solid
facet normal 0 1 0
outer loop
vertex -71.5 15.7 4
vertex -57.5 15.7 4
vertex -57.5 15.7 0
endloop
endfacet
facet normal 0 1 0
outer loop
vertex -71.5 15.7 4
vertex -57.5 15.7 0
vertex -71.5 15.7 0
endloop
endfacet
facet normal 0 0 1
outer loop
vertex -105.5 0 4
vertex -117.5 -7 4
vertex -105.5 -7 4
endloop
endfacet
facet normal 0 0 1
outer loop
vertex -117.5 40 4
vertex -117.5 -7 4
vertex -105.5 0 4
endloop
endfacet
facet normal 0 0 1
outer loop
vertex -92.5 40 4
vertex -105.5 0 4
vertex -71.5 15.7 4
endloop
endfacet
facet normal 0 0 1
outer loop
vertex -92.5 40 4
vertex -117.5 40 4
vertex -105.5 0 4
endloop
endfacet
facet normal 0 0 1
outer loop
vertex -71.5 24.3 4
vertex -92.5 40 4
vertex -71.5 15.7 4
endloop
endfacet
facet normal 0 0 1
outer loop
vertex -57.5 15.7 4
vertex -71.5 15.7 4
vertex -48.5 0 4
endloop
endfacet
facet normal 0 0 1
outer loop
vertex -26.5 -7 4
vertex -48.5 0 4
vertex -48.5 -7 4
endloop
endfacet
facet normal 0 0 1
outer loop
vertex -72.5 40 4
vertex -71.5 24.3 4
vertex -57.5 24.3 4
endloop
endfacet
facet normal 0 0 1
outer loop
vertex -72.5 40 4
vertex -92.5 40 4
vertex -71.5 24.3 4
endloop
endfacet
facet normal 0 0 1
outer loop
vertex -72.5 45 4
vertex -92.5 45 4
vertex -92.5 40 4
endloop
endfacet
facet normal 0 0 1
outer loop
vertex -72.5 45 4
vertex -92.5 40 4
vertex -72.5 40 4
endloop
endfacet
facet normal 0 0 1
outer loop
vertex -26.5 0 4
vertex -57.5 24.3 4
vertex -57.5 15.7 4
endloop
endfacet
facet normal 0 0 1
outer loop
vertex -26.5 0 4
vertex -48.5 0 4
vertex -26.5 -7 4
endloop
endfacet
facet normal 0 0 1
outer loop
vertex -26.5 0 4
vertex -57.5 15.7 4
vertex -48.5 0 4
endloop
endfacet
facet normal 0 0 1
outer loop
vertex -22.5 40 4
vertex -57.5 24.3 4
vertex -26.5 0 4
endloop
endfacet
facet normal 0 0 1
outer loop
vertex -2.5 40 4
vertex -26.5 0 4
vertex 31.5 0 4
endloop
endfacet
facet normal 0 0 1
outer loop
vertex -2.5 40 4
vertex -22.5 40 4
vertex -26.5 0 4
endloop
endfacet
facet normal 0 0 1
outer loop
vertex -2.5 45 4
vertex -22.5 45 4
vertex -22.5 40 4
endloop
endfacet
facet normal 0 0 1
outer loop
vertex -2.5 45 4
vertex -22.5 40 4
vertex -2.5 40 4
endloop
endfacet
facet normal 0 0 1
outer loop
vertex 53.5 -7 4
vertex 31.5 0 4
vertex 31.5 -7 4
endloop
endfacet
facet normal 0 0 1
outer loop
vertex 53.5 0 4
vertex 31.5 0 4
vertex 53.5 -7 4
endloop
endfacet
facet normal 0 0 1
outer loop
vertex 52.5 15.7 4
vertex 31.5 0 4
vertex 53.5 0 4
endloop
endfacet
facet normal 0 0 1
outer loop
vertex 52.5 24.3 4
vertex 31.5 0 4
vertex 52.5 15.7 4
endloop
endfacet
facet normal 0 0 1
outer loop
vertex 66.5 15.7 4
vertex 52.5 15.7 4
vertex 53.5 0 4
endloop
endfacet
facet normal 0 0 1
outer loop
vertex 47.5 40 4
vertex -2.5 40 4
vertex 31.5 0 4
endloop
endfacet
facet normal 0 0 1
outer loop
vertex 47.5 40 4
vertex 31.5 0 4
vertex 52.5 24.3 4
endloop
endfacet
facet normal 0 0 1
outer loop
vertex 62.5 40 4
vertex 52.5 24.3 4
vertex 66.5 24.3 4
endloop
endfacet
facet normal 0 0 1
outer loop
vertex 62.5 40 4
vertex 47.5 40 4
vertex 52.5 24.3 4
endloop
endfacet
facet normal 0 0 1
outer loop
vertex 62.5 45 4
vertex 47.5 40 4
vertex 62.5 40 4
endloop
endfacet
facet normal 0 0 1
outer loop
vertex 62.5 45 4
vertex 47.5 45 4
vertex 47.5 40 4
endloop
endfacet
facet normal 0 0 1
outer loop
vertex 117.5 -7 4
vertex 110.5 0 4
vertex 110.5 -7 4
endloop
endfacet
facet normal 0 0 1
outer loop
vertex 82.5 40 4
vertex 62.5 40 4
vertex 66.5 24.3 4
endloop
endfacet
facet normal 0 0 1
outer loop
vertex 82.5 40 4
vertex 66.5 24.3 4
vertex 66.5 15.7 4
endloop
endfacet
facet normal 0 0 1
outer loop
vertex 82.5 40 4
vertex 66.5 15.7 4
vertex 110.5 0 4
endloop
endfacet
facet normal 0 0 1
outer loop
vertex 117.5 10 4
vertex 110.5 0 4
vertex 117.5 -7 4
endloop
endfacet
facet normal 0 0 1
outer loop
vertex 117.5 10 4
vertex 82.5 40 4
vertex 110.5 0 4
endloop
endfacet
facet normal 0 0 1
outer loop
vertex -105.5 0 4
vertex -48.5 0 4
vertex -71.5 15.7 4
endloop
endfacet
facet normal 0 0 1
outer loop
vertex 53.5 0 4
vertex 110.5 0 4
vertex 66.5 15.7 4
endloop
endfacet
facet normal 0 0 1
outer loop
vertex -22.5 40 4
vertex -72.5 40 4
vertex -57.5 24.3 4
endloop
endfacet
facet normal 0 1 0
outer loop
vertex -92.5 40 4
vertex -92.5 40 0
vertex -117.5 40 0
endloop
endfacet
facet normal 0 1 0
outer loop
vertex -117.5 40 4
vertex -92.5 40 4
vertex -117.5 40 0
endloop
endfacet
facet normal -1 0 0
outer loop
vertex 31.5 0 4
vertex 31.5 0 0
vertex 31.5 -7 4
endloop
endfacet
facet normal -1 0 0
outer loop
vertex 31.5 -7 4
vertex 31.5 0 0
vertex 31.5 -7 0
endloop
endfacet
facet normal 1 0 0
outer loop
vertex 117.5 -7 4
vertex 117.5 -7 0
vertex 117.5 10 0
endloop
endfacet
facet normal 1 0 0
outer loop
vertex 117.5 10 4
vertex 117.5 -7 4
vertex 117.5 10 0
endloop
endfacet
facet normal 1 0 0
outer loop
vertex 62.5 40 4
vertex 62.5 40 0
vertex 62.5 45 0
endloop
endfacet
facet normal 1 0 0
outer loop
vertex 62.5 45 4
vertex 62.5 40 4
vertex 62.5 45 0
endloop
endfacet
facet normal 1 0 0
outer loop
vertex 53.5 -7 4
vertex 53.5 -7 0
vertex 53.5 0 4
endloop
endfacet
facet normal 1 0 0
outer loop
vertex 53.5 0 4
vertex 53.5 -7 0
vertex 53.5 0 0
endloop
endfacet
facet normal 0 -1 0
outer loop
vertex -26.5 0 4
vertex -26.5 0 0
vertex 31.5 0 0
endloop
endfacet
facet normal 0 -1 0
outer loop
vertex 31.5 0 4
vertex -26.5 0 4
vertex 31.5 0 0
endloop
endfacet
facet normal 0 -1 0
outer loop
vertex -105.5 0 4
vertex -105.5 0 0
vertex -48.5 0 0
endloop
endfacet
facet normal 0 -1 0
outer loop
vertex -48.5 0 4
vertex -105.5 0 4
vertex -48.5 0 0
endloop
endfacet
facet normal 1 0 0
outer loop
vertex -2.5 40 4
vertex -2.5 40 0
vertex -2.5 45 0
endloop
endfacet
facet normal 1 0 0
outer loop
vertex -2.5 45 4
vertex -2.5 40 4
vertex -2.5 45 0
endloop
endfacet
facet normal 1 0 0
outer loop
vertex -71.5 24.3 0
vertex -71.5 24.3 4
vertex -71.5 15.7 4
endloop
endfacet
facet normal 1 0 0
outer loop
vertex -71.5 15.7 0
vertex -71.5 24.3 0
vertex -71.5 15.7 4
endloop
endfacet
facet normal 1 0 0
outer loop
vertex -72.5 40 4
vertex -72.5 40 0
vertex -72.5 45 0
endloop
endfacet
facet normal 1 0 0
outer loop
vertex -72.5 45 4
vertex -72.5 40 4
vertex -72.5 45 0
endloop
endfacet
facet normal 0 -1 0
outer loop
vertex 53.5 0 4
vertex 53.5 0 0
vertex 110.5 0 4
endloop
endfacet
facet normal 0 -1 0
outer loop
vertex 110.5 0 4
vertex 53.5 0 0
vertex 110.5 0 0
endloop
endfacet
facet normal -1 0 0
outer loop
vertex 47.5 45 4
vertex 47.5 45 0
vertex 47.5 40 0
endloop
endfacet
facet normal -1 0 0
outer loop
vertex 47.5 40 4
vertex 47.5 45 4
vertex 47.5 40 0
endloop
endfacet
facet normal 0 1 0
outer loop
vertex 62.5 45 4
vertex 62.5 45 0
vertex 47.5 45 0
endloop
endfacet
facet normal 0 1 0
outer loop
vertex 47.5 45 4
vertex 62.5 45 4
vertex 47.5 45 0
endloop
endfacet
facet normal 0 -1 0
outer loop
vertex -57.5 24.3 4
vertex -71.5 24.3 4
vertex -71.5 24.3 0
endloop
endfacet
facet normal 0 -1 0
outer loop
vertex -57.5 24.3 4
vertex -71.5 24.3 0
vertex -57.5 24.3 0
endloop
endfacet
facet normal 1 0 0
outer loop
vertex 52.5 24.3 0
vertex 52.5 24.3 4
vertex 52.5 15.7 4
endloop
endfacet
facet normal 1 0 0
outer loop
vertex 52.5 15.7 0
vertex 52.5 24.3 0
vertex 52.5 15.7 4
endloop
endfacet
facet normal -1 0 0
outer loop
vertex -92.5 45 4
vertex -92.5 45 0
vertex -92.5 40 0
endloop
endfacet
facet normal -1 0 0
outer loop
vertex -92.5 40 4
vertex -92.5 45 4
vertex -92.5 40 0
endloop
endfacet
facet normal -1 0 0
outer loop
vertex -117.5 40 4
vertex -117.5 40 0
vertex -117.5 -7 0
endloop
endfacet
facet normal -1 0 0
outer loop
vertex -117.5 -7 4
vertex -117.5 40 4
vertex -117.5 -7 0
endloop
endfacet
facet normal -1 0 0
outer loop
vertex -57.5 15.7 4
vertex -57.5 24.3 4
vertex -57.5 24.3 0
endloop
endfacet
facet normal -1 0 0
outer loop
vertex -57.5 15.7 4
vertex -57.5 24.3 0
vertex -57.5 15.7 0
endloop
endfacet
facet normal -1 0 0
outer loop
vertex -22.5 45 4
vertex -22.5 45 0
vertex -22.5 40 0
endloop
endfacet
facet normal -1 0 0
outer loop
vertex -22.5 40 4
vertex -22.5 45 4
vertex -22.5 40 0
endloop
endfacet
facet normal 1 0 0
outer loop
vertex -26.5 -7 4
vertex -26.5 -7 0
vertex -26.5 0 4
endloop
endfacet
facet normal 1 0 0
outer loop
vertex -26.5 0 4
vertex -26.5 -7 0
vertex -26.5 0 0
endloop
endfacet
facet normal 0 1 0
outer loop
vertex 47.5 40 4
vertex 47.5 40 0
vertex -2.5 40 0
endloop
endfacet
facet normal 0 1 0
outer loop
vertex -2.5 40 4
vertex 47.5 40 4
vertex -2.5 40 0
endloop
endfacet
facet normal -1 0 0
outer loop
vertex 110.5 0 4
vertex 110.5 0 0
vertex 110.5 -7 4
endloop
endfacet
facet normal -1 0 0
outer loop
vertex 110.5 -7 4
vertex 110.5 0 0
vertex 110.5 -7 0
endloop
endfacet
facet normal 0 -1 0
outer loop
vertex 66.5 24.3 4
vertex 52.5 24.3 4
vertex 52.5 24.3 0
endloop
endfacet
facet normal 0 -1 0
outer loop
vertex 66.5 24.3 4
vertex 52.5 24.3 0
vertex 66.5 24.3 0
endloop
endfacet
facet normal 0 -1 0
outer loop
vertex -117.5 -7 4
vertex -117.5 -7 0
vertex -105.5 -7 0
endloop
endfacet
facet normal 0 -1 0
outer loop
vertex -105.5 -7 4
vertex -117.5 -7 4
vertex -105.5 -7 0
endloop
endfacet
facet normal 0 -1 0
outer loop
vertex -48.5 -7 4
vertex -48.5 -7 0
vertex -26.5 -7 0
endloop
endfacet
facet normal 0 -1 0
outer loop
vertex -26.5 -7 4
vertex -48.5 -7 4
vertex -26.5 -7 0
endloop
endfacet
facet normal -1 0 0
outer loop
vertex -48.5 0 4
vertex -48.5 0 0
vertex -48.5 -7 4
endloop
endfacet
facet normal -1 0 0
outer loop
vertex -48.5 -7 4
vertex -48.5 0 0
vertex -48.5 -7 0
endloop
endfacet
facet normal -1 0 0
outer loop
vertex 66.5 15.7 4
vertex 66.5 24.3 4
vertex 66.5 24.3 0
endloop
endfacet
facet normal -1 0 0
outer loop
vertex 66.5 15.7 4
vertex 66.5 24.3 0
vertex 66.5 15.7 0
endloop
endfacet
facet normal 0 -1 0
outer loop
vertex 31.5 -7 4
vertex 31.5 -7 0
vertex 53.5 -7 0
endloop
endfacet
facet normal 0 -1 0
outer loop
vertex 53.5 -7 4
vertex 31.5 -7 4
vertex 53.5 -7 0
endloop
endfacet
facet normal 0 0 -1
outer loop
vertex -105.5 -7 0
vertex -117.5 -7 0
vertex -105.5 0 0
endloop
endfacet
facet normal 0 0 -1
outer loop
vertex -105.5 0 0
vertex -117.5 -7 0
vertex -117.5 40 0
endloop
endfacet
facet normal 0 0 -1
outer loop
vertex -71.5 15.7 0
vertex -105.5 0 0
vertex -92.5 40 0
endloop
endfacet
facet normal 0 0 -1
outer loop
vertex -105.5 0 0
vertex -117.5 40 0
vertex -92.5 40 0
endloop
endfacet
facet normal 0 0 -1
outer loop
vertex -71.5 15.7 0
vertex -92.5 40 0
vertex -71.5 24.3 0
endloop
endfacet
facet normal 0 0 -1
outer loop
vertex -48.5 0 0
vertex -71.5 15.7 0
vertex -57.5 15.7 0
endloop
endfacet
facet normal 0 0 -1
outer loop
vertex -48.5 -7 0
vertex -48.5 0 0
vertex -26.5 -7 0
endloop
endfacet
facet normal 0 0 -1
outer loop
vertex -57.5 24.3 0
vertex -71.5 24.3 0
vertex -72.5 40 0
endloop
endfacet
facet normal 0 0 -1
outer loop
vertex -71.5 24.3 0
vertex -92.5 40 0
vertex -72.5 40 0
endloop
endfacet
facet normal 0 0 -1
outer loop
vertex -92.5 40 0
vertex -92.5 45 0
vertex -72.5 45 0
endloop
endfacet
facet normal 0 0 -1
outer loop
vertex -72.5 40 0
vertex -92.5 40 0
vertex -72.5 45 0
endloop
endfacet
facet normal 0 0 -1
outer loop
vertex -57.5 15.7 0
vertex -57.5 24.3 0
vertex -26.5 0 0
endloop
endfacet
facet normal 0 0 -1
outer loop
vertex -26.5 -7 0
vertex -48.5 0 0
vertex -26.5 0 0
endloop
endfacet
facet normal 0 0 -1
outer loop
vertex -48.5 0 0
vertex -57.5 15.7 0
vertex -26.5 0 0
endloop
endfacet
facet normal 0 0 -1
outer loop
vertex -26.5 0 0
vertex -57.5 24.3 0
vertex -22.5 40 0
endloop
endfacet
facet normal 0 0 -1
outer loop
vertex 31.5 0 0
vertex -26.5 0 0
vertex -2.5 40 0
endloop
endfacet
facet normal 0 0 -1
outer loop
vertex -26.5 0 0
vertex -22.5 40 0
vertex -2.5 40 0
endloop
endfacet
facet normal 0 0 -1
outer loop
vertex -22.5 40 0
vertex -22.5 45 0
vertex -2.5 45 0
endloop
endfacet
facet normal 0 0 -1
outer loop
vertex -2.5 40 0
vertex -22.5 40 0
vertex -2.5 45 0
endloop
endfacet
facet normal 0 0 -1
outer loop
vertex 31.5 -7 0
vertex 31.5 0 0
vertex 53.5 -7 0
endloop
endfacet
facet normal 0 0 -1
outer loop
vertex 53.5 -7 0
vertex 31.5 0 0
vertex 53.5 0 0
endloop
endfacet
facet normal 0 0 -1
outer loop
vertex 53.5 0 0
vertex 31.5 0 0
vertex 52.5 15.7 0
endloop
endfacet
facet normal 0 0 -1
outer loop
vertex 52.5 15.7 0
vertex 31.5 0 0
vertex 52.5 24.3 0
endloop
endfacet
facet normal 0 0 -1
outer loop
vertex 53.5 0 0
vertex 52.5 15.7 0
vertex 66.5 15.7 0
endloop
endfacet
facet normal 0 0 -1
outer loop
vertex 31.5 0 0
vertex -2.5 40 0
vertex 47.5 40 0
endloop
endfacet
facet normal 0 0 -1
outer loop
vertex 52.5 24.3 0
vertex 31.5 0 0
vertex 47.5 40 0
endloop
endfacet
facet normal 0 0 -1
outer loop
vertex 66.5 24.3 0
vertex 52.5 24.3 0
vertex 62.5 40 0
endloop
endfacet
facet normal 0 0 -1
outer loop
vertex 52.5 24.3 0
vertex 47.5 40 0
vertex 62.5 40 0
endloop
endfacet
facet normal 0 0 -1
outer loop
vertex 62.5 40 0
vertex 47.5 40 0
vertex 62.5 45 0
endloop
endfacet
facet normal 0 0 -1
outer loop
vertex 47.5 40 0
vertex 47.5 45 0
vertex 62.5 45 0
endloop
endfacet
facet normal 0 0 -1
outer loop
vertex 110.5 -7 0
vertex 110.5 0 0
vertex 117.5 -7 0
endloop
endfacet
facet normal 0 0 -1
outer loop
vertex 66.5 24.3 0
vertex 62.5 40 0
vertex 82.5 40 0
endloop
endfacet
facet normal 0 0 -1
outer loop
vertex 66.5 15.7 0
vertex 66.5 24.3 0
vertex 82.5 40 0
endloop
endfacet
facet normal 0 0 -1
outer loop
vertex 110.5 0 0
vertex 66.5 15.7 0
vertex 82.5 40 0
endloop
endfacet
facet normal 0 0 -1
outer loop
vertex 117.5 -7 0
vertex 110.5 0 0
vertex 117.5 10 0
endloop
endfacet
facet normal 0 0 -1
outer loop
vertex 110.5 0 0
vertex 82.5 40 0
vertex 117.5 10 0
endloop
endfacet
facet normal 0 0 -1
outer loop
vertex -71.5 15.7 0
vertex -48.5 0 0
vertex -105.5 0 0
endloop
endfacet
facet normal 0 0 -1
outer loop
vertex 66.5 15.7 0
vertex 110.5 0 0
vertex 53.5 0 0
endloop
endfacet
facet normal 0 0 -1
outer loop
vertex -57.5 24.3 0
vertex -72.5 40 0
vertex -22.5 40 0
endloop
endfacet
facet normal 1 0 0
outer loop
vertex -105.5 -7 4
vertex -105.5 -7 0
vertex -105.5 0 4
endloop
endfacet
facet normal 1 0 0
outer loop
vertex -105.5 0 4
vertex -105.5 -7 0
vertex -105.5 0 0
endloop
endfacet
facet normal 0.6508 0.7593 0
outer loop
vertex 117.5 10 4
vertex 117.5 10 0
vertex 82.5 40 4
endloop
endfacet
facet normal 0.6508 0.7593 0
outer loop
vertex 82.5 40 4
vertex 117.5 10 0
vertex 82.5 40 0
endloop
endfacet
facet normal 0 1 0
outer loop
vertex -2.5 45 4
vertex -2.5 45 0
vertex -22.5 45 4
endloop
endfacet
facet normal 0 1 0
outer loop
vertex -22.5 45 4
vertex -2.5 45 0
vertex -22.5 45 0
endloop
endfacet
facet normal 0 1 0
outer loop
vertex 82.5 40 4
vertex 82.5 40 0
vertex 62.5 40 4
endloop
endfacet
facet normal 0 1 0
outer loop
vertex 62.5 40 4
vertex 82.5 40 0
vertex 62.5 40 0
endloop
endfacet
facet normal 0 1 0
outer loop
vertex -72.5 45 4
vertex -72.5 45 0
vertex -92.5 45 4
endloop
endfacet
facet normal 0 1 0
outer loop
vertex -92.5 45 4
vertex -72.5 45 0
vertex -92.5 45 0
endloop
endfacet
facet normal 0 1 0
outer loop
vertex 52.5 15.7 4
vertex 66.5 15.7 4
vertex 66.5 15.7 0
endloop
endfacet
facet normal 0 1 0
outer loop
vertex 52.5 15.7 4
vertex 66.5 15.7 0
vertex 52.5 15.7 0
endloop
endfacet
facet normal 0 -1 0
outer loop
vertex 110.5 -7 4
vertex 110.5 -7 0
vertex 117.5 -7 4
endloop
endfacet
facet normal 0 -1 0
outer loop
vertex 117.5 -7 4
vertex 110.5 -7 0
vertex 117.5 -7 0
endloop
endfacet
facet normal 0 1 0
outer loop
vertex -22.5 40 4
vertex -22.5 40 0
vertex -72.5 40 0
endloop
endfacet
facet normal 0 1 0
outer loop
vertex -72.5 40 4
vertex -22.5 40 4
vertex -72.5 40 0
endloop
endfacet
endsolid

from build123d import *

# Parameters (mm, degrees)
BOSS_EXTRUDE2_DEPTH = 4
CUT_EXTRUDE1_DEPTH  = 4


with BuildPart() as part:
    # Sketch1 → Boss-Extrude2 (new body)
    with BuildSketch(Plane.XY):
        Polygon((-105.5, 0), (-48.5, 0), (-48.5, -7), (-26.5, -7), (-26.5, 0), (31.5, 0), (31.5, -7), (53.5, -7), (53.5, 0), (110.5, 0), (110.5, -7), (117.5, -7), (117.5, 0), (117.5, 10), (82.5, 40), (62.5, 40), (62.5, 45), (47.5, 45), (47.5, 40), (-2.5, 40), (-2.5, 45), (-22.5, 45), (-22.5, 40), (-72.5, 40), (-72.5, 45), (-92.5, 45), (-92.5, 40), (-117.5, 40), (-117.5, 0), (-117.5, -7), (-105.5, -7), align=None)
    extrude(amount=BOSS_EXTRUDE2_DEPTH)

    # Sketch2 → Cut-Extrude1 (cut)
    with BuildSketch(Plane.XY.offset(4)):
        Polygon((-71.5, 20), (-71.5, 24.3), (-57.5, 24.3), (-57.5, 15.7), (-71.5, 15.7), align=None)
        Polygon((52.5, 20), (52.5, 24.3), (66.5, 24.3), (66.5, 15.7), (52.5, 15.7), align=None)
    extrude(amount=-CUT_EXTRUDE1_DEPTH, mode=Mode.SUBTRACT)


solid = part.part
